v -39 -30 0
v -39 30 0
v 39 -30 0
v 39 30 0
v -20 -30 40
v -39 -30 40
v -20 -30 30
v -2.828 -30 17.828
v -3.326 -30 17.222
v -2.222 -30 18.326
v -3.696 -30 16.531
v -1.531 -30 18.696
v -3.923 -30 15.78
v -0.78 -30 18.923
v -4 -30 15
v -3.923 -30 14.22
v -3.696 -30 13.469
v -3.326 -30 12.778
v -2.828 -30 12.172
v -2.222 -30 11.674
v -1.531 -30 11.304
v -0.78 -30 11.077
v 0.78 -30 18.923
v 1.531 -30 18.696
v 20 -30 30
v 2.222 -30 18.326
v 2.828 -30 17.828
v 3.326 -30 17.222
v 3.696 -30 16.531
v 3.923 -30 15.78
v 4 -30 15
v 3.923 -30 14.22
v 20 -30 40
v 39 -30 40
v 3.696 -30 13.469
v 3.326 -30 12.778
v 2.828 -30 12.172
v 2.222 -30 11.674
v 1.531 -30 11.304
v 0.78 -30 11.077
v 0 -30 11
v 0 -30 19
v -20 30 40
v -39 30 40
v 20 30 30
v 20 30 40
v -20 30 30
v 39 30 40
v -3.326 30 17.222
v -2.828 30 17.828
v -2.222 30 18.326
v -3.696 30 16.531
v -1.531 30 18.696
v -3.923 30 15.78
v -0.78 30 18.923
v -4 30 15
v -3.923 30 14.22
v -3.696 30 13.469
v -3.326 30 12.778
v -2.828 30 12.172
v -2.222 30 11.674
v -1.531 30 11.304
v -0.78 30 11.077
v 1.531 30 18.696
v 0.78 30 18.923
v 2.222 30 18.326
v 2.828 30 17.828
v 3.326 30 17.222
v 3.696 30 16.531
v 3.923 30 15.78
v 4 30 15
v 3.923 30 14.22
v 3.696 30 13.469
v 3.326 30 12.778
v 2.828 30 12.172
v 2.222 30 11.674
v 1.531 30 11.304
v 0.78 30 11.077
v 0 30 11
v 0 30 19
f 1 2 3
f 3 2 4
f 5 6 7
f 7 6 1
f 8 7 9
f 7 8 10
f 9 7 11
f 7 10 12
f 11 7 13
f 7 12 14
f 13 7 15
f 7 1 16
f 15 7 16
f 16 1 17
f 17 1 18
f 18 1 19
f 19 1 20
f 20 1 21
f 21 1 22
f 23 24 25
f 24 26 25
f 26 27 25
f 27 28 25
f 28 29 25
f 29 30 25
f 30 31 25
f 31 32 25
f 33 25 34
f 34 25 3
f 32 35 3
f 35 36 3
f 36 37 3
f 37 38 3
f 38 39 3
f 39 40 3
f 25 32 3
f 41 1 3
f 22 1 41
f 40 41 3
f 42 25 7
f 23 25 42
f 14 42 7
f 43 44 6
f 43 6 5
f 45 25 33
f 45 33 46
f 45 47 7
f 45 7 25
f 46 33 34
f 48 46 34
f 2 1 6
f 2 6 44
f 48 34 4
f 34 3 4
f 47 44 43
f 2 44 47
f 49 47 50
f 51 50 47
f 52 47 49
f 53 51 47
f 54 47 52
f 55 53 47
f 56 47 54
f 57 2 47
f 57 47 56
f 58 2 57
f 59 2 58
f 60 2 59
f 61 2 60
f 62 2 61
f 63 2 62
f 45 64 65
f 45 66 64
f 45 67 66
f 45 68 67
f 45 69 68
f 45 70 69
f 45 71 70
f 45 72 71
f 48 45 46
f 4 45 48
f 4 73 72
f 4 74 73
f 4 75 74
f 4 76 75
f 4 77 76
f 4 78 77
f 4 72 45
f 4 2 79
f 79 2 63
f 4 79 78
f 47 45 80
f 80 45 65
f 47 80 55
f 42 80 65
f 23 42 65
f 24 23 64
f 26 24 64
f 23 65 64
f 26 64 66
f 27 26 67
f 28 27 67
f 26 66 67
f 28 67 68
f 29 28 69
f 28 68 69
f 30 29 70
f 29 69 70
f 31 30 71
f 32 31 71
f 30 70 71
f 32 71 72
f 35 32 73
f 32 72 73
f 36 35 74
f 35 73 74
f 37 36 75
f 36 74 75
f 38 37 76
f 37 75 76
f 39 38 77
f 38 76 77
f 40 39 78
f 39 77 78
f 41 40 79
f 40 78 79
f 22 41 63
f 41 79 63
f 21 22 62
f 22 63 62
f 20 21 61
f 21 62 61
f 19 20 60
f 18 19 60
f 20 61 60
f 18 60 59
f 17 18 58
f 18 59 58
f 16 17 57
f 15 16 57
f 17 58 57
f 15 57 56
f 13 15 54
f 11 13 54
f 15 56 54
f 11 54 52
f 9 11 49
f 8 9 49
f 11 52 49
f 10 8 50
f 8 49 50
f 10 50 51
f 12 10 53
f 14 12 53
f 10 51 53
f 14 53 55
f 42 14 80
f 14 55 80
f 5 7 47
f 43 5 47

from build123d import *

# Parameters (mm, degrees)
SKETCH_1_W          = 78
SKETCH_1_H          = 60
EXTRUDE_1_DEPTH     = 30
SKETCH_2_W          = 19
SKETCH_2_H          = 60
EXTRUDE_2_DEPTH     = 10
SKETCH_3_R          = 4
CUT_EXTRUDE_1_DEPTH = 60


with BuildPart() as part:
    # 草图1 → 凸台-拉伸1 (new body)
    with BuildSketch(Plane.XY):
        Rectangle(SKETCH_1_W, SKETCH_1_H)
    extrude(amount=EXTRUDE_1_DEPTH)

    # 草图2 → 凸台-拉伸2 (add)
    with BuildSketch(Plane.XY.offset(30)):
        with Locations((29.5, 0)):
            Rectangle(SKETCH_2_W, SKETCH_2_H)
        with Locations((-29.5, 0)):
            Rectangle(SKETCH_2_W, SKETCH_2_H)
    extrude(amount=EXTRUDE_2_DEPTH)

    # 草图3 → 切除-拉伸1 (cut)
    with BuildSketch(Plane(origin=(0, 30, 0), x_dir=(1, 0, 0), z_dir=(0, 1, 0))):
        with Locations(Location((0, -15, 0), (0, 0, 270))):
            Circle(SKETCH_3_R)
    extrude(amount=-CUT_EXTRUDE_1_DEPTH, mode=Mode.SUBTRACT)


solid = part.part
